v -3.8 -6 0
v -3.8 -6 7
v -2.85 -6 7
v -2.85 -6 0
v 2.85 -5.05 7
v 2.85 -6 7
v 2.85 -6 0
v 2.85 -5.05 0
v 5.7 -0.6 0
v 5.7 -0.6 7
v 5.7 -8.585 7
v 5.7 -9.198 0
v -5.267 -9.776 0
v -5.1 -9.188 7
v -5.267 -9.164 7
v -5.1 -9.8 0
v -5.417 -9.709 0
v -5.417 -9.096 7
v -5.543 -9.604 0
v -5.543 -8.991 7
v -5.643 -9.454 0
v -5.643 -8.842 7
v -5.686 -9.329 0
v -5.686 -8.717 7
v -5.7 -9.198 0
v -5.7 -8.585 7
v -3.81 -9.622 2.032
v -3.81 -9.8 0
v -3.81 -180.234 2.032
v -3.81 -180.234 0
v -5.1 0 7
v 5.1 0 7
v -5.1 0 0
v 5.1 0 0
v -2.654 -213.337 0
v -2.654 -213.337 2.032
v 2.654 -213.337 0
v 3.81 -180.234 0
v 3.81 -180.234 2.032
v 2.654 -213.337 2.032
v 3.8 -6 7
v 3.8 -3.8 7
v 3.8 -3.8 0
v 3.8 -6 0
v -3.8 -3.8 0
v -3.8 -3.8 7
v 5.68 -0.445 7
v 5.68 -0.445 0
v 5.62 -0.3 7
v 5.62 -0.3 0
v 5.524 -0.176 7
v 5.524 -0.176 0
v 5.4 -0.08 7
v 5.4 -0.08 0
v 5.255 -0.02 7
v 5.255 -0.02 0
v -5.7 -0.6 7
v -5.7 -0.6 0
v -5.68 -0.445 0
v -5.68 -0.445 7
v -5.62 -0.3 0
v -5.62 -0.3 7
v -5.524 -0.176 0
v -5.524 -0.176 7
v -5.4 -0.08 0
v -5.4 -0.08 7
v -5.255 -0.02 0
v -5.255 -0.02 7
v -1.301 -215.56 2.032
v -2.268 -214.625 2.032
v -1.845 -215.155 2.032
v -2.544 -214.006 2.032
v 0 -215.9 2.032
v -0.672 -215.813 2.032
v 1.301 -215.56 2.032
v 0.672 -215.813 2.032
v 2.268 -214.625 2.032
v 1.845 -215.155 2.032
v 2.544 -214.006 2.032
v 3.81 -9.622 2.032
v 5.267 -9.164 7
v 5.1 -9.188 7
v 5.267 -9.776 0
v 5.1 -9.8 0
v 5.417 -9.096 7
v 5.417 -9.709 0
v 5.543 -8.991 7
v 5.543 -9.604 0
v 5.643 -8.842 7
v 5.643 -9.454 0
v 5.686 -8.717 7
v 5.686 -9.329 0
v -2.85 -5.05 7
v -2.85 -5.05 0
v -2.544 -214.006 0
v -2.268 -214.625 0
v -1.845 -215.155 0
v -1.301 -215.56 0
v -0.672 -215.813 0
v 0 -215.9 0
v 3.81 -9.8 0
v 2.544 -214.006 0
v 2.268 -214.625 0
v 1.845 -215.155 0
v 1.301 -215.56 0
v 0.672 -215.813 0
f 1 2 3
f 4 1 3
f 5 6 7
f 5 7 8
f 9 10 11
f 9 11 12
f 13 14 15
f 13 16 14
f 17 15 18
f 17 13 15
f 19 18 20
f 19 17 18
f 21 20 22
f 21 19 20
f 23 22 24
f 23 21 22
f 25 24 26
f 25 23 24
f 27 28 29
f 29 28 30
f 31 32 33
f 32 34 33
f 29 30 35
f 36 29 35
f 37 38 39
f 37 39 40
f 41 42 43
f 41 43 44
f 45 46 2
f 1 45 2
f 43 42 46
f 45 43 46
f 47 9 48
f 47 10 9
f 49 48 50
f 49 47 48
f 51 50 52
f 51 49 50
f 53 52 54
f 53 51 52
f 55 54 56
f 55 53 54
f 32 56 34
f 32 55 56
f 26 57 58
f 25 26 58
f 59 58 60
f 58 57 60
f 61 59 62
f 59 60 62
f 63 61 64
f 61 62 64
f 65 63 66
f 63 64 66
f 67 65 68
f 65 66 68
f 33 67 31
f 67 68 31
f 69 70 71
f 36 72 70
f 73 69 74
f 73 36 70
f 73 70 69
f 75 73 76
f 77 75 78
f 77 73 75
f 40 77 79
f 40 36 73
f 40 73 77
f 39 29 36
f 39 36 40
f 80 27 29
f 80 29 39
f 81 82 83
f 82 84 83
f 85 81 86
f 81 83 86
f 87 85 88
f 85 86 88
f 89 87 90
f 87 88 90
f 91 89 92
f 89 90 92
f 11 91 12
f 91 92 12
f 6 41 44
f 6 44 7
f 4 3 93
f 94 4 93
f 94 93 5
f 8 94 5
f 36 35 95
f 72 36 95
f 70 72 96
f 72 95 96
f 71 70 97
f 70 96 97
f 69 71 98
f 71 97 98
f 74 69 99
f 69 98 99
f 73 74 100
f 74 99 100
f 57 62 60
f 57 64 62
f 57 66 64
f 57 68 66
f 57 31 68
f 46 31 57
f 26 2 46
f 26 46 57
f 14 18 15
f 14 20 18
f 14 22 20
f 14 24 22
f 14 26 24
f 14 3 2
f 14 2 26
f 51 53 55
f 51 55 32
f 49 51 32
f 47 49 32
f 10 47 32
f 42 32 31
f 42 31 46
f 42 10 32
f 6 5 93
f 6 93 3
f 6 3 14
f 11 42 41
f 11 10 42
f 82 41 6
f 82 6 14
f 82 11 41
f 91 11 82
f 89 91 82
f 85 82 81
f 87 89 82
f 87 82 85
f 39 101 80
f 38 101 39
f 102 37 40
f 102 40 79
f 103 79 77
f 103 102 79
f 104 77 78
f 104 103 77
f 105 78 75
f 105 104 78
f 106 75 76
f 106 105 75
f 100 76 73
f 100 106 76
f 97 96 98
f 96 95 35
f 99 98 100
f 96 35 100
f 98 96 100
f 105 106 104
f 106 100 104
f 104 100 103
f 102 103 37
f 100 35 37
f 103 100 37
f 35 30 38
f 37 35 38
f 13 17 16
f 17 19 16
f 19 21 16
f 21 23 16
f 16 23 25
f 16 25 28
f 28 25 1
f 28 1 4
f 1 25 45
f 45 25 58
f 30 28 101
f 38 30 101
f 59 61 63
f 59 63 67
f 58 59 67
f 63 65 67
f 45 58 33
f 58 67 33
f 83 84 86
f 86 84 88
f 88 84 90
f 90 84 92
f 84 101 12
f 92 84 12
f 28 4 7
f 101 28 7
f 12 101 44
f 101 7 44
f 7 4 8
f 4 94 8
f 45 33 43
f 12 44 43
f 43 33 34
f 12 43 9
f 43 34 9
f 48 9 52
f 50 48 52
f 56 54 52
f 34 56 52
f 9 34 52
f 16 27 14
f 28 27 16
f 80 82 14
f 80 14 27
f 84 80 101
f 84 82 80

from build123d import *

# Parameters (mm, degrees)
BOSS_EXTRUDE1_DEPTH = 2.032
BOSS_EXTRUDE2_DEPTH = 5.7
CUT_EXTRUDE1_DEPTH  = 7
FILLET1_R           = 0.6


with BuildPart() as part:
    # Sketch1 → Boss-Extrude1 (new body)
    with BuildSketch(Plane.XY):
        with BuildLine():
            Line((3.81, 0), (3.81, -180.234))
            Line((3.81, -180.234), (2.654016147, -213.337046398))
            ThreePointArc((2.654016147, -213.337046398), (1.844758309, -215.154669263), (0, -215.9))
            Line((0, -215.9), (0, 0))
            Line((0, 0), (3.81, 0))
        make_face()
    extrude(amount=BOSS_EXTRUDE1_DEPTH)

    # Sketch5 → Boss-Extrude2 (add)
    with BuildSketch(Plane.ZY):
        Polygon((0, 0), (7, 0), (7, -9.187579355), (0, -9.8), align=None)
    extrude(amount=-BOSS_EXTRUDE2_DEPTH)

    # Sketch4 → Cut-Extrude1 (cut)
    with BuildSketch(Plane.XY.offset(7)):
        Polygon((0, -3.8), (3.8, -3.8), (3.8, -6), (2.85, -6), (2.85, -5.05), (0, -5.05), align=None)
    extrude(amount=-CUT_EXTRUDE1_DEPTH, mode=Mode.SUBTRACT)

    # Fillet1
    fillet1_edges = [part.edges().sort_by_distance(p)[0] for p in [
        (5.7, 0, 3.5),
        (5.7, -9.493789678, 3.5),
    ]]
    fillet(fillet1_edges, radius=FILLET1_R)

    # Mirror1: part across plane


with BuildPart() as part_1:
    add(part.part)
    add(part.part.mirror(Plane(origin=(0, -215.9, 2.032), x_dir=(0, 0, 1), z_dir=(1, 0, 0))))


solid = part_1.part
